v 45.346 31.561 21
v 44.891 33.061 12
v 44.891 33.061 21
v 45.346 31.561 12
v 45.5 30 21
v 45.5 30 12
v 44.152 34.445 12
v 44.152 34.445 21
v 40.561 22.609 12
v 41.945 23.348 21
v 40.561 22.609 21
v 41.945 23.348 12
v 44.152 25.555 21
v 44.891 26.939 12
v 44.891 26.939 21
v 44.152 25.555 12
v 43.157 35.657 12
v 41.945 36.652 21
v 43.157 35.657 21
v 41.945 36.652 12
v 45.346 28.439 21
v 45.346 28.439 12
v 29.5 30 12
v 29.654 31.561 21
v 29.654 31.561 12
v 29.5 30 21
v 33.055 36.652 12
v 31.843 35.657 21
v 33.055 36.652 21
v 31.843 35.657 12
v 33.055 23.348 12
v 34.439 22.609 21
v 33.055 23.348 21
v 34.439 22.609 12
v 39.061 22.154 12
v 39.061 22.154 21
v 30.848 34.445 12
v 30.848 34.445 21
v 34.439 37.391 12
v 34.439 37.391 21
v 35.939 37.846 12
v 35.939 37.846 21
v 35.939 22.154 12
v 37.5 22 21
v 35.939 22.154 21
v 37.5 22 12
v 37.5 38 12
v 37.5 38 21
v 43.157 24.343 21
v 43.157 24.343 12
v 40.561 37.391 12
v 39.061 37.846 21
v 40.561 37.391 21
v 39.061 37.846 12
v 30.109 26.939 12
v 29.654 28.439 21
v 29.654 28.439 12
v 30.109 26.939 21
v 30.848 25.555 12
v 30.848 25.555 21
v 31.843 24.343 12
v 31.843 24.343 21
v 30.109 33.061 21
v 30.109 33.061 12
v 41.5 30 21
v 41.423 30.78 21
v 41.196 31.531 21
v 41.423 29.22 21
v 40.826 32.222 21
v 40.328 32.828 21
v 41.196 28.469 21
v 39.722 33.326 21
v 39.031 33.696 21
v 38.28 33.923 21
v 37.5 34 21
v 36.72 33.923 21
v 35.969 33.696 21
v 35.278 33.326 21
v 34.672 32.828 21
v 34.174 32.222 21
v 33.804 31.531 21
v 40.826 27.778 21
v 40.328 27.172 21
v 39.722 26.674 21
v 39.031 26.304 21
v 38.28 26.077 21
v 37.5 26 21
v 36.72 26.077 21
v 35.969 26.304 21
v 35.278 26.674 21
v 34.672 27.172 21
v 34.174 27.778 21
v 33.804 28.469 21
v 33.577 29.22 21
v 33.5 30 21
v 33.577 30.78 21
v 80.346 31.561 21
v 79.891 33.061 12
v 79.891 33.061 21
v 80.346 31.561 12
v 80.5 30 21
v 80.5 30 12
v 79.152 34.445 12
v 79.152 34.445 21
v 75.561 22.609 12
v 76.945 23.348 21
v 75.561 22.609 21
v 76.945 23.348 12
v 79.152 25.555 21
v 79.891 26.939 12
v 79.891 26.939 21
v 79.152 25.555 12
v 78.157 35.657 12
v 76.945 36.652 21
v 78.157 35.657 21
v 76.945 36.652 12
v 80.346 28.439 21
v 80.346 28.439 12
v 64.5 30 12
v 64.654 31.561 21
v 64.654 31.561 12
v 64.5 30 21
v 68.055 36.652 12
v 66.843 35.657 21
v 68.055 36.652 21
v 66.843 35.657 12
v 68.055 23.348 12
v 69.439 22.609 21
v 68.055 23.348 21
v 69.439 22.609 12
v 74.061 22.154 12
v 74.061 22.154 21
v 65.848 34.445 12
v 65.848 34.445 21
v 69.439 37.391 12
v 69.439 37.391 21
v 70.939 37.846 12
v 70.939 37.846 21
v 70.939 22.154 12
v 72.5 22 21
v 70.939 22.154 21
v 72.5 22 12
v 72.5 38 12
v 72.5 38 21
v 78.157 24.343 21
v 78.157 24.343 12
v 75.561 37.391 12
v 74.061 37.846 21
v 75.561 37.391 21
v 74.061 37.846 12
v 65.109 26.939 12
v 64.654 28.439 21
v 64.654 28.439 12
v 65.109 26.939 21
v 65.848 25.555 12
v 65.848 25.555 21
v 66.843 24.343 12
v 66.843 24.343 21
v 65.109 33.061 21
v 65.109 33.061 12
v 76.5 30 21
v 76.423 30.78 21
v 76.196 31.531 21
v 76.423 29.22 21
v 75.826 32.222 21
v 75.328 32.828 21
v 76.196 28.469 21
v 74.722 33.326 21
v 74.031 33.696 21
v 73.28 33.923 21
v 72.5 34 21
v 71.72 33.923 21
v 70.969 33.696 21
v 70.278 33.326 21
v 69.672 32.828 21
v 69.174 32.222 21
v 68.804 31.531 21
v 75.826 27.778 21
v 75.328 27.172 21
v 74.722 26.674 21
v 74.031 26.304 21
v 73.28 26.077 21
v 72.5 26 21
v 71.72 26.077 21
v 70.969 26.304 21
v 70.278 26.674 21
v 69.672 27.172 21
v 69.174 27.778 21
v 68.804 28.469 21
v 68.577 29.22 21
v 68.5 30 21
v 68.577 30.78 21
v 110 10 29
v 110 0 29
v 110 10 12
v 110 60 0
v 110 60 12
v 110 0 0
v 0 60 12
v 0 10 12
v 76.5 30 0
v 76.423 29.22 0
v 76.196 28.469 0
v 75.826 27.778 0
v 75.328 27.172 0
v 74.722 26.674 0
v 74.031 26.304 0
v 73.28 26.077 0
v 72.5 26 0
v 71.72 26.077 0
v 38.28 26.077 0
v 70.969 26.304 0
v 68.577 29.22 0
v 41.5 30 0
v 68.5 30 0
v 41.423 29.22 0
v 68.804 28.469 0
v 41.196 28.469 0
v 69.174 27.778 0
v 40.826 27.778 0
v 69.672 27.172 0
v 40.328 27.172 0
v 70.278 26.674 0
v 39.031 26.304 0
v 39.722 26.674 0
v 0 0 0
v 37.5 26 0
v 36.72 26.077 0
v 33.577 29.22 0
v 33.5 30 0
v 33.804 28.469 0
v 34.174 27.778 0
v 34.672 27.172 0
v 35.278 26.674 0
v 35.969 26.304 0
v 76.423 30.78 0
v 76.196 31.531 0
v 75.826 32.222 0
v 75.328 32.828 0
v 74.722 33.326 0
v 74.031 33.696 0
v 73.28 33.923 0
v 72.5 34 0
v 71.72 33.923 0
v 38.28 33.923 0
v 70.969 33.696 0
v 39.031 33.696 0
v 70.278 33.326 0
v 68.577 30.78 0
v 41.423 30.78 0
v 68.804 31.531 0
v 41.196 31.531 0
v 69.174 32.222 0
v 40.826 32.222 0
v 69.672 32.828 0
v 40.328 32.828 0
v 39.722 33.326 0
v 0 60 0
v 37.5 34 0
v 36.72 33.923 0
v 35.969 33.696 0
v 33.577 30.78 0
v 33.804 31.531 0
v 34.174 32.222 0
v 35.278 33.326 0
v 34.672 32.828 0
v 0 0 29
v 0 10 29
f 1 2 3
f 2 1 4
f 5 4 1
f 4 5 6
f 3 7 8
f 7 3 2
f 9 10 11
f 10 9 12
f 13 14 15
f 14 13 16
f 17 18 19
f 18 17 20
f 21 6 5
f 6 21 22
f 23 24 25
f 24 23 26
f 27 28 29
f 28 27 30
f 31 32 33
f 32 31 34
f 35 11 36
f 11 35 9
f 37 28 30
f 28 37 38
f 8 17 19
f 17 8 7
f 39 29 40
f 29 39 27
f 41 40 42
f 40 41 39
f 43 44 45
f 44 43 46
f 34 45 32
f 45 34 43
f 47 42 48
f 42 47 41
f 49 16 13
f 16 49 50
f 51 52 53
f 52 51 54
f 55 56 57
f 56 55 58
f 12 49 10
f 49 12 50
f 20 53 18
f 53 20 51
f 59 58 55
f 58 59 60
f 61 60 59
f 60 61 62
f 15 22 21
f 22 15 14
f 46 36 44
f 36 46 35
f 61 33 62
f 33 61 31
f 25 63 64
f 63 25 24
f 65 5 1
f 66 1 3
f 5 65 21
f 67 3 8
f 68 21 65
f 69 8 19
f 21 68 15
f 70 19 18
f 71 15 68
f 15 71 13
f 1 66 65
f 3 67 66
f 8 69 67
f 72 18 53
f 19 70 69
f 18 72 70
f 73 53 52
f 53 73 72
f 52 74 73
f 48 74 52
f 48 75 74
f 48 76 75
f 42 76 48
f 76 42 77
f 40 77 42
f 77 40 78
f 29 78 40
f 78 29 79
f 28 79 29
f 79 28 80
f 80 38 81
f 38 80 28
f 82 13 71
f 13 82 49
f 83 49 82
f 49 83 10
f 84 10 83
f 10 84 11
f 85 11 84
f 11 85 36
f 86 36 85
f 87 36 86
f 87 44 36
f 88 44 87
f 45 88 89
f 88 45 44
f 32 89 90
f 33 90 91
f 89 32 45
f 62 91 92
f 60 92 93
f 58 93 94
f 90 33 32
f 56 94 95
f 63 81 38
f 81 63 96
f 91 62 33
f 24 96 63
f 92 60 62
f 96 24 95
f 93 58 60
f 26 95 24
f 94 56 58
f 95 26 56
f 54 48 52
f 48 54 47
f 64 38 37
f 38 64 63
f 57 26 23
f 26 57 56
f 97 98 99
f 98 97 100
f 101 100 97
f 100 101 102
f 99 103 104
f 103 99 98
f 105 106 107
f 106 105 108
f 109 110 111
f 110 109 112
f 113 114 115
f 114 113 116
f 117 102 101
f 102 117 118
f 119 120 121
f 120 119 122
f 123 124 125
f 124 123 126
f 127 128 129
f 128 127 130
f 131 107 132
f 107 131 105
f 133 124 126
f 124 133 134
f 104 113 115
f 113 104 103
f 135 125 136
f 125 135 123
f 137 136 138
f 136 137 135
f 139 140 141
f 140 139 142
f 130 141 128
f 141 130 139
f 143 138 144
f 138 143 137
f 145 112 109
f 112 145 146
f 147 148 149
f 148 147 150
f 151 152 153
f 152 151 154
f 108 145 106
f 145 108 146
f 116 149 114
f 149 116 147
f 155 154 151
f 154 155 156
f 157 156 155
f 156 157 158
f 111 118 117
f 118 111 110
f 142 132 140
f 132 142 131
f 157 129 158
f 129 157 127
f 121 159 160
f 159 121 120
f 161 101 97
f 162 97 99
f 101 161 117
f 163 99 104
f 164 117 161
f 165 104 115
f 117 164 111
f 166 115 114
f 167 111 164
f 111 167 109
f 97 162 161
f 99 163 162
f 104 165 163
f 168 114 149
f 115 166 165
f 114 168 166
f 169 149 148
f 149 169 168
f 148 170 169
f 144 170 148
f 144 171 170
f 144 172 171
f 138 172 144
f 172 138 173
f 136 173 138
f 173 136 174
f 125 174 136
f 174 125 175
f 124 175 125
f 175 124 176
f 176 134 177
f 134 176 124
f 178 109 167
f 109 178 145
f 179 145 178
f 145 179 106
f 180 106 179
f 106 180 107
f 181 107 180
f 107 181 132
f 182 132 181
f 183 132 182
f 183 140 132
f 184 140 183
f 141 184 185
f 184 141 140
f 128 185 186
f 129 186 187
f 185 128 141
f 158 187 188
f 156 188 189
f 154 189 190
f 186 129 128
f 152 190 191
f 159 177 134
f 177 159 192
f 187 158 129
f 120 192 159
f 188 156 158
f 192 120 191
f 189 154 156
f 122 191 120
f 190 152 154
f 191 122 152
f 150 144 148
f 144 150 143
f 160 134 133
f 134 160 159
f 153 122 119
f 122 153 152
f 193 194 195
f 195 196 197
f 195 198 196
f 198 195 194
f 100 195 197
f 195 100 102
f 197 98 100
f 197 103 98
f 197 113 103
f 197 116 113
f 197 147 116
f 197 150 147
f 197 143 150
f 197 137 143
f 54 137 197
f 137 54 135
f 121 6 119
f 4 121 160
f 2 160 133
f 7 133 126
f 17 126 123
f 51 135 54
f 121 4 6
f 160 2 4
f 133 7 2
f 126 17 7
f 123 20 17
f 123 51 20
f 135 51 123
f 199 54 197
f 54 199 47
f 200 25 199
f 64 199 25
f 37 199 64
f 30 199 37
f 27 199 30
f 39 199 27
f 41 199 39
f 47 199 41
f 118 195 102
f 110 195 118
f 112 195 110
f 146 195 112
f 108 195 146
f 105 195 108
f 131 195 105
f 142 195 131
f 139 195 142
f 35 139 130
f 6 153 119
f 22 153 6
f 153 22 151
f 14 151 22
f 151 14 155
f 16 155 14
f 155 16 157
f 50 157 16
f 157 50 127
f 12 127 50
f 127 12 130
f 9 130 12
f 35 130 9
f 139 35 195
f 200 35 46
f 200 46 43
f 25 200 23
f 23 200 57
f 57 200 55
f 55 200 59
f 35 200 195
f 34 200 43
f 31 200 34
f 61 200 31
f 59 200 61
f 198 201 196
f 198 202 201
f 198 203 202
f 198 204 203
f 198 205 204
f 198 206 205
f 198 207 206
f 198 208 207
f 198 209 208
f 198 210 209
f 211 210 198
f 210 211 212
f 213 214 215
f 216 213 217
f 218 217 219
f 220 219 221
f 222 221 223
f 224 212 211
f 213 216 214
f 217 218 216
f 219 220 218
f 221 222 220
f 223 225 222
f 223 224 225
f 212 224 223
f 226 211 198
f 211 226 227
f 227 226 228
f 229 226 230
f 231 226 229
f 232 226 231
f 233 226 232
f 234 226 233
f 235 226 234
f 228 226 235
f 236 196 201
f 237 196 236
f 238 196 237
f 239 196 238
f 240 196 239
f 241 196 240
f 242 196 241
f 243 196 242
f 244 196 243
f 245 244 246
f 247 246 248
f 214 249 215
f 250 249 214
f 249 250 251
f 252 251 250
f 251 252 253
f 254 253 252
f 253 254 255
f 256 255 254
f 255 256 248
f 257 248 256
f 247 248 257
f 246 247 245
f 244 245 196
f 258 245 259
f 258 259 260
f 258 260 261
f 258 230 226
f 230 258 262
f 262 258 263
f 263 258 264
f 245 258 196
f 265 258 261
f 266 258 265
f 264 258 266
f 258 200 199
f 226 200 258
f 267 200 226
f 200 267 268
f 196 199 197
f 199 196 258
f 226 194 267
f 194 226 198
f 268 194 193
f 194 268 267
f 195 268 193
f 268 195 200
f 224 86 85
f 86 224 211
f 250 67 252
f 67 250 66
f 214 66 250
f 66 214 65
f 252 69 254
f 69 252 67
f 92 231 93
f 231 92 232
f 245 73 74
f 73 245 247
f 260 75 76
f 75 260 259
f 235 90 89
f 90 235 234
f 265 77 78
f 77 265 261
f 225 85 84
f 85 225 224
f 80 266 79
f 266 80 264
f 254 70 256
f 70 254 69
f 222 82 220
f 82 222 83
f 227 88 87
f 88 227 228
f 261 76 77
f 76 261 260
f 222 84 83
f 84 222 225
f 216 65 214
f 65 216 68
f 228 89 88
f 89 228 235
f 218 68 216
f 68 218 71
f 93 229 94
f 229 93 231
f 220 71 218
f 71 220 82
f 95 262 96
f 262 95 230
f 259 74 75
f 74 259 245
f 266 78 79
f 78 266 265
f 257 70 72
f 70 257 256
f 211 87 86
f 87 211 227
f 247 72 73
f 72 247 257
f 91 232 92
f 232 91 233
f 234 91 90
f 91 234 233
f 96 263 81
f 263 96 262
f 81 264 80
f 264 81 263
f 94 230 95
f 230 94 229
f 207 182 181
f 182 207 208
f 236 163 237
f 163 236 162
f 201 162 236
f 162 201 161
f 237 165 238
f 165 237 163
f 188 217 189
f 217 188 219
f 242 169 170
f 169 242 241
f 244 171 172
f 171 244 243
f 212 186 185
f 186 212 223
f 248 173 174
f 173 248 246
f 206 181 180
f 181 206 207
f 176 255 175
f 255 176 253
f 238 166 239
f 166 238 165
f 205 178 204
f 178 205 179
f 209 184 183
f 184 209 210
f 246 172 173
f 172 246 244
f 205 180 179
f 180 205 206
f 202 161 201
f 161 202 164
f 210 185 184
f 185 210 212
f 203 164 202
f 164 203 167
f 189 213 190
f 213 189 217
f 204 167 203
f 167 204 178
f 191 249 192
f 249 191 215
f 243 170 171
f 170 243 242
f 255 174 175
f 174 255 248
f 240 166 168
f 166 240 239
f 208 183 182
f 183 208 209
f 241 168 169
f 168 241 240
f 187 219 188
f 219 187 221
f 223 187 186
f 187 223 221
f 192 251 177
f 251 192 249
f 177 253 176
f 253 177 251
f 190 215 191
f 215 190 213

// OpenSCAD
$fn = 32;

// ----------------------------------------------------------------------
// Drill jig: fence jig
// ----------------------------------------------------------------------

// --- parameters (mm) ---
plate_l = 110;            // plate length, X
plate_w = 60;             // plate width, Y
plate_t = 12;             // plate thickness
boss_d = 16;              // guide boss diameter
boss_h = 10;              // boss height above the plate
guide_d = 8;              // guide hole diameter
boss_pitch = 35;          // boss pitch
fence_h = 18;             // fence height above the plate
fence_t = 10;             // fence thickness

n_boss = 2;  // guide bosses
boss_x0 = (plate_l - (n_boss - 1) * boss_pitch) / 2;  // first boss X
boss_top = plate_t - 1 + boss_h;  // boss crown height
fence_top = plate_t - 1 + fence_h;  // fence crown height
total_h = max([fence_top, boss_top]);  // overall height

difference() {
  union() {
  cube([plate_l, plate_w, plate_t]);
  for (i = [0 : n_boss - 1])
    translate([boss_x0 + i * boss_pitch, plate_w / 2, plate_t - 1])
      cylinder(h = boss_h, d = boss_d);
  translate([0, 0, plate_t - 1]) cube([plate_l, fence_t, fence_h]);
  }
  for (i = [0 : n_boss - 1])
    translate([boss_x0 + i * boss_pitch, plate_w / 2, -1])
      cylinder(h = plate_t + boss_h, d = guide_d);
}
